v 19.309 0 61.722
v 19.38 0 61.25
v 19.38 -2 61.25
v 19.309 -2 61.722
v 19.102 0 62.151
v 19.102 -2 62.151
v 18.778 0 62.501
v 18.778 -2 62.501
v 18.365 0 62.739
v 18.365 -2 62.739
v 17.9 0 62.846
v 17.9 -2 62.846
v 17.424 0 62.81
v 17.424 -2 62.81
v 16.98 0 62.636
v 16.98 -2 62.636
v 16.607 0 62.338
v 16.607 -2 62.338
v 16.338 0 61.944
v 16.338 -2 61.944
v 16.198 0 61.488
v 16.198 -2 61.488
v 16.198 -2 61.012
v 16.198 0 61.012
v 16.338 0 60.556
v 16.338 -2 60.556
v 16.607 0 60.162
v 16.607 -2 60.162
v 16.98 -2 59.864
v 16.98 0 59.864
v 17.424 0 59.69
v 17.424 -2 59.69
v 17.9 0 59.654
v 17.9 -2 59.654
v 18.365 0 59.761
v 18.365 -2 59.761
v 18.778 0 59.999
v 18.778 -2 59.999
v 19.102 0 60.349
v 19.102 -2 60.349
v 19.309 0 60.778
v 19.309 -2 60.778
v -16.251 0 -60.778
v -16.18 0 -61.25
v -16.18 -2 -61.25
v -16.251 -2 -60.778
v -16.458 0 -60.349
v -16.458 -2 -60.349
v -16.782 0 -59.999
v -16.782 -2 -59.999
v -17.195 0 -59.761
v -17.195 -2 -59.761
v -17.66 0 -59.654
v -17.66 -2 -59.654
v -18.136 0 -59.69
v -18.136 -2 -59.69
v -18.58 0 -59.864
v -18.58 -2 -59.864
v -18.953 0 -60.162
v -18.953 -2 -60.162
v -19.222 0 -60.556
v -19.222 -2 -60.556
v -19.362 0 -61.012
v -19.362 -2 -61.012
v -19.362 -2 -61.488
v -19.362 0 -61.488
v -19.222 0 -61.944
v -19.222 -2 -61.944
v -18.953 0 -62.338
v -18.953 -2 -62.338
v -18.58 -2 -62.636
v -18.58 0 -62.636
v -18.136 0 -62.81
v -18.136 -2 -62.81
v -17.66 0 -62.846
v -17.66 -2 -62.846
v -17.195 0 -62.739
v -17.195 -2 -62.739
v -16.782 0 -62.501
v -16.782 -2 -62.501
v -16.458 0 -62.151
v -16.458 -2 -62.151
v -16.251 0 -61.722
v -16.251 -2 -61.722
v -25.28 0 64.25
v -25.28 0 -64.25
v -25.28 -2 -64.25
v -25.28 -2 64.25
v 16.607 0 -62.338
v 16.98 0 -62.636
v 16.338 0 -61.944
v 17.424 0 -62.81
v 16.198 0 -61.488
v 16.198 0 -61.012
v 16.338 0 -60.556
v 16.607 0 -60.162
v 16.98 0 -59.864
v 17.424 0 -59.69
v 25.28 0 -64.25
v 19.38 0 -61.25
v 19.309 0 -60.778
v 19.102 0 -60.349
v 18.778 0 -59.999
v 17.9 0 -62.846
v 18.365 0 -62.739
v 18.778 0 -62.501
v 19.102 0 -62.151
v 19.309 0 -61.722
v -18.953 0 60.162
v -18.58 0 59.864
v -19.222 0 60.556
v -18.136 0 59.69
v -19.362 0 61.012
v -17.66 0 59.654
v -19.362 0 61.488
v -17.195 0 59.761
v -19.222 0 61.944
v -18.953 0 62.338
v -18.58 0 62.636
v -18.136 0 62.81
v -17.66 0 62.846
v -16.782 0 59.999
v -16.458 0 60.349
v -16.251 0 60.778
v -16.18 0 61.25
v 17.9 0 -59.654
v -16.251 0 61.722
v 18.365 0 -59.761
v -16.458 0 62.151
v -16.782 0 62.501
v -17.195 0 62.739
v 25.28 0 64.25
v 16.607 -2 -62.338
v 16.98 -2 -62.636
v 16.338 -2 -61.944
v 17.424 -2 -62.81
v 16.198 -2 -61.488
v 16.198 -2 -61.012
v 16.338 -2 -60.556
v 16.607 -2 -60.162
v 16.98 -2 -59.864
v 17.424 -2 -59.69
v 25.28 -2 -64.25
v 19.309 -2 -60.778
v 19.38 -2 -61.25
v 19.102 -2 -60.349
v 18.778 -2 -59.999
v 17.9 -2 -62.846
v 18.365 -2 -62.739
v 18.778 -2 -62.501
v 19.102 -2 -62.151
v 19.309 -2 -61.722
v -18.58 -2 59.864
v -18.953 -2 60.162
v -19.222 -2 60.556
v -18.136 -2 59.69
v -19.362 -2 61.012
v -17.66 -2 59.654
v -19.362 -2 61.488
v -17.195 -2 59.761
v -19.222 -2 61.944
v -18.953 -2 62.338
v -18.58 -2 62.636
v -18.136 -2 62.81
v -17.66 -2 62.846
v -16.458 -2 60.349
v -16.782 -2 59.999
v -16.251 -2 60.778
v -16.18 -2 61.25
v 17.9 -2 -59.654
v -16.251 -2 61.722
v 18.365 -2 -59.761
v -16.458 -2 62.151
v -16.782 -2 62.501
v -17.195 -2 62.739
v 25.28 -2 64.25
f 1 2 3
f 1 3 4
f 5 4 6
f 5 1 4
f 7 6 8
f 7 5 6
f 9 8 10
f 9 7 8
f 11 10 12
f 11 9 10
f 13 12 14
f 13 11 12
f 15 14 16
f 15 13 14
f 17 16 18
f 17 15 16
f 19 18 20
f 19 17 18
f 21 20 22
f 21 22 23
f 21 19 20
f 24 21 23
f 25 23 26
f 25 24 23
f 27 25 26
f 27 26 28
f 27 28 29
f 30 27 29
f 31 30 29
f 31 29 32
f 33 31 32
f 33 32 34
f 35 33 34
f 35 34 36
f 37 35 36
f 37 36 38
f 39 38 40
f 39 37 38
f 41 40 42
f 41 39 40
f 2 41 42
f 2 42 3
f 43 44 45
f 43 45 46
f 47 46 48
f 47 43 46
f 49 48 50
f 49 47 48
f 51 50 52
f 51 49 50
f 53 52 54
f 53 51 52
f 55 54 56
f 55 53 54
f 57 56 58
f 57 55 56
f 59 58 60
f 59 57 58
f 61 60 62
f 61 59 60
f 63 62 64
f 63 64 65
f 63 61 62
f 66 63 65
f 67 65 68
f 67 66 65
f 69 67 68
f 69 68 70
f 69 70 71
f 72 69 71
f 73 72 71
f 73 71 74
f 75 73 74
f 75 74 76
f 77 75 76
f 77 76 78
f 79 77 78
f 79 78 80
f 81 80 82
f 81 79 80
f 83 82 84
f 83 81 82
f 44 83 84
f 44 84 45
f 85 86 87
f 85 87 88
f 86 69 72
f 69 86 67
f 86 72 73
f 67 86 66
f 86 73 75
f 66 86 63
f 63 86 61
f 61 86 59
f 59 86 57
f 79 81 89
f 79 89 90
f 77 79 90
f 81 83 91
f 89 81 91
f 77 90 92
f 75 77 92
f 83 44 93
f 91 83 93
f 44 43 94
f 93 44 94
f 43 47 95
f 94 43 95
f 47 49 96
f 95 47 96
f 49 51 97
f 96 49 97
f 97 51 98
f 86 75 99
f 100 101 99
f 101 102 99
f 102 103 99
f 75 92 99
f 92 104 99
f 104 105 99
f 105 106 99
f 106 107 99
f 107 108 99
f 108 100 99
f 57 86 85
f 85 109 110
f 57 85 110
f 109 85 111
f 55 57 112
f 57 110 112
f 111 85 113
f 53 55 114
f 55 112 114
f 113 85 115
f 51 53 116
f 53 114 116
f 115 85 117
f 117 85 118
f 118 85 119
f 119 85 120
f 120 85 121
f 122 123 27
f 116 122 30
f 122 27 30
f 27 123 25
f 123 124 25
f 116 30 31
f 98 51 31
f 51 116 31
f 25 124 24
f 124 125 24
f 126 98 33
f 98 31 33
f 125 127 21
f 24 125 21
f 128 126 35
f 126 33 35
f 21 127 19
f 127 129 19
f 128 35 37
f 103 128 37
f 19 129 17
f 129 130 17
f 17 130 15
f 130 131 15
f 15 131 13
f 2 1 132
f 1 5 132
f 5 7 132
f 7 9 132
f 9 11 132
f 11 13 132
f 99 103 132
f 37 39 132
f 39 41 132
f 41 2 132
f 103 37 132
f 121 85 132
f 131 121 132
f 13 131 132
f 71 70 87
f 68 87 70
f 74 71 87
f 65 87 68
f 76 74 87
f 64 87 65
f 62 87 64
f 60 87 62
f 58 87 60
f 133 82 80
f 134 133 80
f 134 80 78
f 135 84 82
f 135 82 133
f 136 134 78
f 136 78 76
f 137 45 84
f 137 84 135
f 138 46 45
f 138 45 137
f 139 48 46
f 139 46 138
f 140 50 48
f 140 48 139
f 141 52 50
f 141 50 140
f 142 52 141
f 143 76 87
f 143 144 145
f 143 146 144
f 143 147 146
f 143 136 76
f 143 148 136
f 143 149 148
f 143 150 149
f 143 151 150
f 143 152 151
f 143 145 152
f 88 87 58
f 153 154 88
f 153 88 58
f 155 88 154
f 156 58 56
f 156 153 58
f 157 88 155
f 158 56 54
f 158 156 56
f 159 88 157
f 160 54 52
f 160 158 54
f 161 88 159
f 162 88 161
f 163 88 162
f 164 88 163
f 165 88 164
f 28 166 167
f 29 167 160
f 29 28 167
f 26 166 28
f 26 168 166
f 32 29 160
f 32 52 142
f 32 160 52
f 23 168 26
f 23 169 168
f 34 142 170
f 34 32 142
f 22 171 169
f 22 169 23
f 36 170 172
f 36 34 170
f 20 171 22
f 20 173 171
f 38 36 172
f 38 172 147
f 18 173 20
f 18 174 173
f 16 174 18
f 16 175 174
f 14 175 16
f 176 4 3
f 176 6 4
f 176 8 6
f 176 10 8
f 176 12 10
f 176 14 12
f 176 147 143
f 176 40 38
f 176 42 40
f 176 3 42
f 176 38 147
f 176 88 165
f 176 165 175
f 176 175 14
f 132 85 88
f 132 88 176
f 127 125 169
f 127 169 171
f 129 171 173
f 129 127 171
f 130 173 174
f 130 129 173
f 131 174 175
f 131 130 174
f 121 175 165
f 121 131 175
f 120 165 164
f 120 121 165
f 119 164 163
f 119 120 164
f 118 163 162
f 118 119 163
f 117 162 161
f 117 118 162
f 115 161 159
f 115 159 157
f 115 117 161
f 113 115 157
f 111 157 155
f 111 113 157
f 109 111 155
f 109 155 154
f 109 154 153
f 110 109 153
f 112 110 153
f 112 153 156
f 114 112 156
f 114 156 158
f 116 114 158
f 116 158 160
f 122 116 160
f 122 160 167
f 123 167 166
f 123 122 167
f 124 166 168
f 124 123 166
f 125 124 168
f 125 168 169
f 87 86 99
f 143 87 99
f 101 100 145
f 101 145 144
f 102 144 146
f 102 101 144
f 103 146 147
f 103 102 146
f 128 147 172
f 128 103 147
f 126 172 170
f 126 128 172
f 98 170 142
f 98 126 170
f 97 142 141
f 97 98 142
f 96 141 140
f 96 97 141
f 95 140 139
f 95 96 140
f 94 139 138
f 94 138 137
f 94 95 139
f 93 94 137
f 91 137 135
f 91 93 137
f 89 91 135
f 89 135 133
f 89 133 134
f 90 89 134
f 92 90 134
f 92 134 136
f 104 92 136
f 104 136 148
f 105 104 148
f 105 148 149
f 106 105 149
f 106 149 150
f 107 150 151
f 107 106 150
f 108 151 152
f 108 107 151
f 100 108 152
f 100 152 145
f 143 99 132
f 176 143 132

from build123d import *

# Parameters (mm, degrees)
SKETCH_W  = 50.56
SKETCH_H  = 128.5
SKETCH_R  = 1.6
PAD_DEPTH = 2


with BuildPart() as part:
    # Sketch → Pad (new body)
    with BuildSketch(Plane.XZ):
        Rectangle(SKETCH_W, SKETCH_H)
        with Locations((-17.78, 61.25)):
            Circle(SKETCH_R, mode=Mode.SUBTRACT)
        with Locations((17.78, 61.25)):
            Circle(SKETCH_R, mode=Mode.SUBTRACT)
        with Locations((17.78, -61.25)):
            Circle(SKETCH_R, mode=Mode.SUBTRACT)
        with Locations((-17.78, -61.25)):
            Circle(SKETCH_R, mode=Mode.SUBTRACT)
    extrude(amount=PAD_DEPTH)


solid = part.part
